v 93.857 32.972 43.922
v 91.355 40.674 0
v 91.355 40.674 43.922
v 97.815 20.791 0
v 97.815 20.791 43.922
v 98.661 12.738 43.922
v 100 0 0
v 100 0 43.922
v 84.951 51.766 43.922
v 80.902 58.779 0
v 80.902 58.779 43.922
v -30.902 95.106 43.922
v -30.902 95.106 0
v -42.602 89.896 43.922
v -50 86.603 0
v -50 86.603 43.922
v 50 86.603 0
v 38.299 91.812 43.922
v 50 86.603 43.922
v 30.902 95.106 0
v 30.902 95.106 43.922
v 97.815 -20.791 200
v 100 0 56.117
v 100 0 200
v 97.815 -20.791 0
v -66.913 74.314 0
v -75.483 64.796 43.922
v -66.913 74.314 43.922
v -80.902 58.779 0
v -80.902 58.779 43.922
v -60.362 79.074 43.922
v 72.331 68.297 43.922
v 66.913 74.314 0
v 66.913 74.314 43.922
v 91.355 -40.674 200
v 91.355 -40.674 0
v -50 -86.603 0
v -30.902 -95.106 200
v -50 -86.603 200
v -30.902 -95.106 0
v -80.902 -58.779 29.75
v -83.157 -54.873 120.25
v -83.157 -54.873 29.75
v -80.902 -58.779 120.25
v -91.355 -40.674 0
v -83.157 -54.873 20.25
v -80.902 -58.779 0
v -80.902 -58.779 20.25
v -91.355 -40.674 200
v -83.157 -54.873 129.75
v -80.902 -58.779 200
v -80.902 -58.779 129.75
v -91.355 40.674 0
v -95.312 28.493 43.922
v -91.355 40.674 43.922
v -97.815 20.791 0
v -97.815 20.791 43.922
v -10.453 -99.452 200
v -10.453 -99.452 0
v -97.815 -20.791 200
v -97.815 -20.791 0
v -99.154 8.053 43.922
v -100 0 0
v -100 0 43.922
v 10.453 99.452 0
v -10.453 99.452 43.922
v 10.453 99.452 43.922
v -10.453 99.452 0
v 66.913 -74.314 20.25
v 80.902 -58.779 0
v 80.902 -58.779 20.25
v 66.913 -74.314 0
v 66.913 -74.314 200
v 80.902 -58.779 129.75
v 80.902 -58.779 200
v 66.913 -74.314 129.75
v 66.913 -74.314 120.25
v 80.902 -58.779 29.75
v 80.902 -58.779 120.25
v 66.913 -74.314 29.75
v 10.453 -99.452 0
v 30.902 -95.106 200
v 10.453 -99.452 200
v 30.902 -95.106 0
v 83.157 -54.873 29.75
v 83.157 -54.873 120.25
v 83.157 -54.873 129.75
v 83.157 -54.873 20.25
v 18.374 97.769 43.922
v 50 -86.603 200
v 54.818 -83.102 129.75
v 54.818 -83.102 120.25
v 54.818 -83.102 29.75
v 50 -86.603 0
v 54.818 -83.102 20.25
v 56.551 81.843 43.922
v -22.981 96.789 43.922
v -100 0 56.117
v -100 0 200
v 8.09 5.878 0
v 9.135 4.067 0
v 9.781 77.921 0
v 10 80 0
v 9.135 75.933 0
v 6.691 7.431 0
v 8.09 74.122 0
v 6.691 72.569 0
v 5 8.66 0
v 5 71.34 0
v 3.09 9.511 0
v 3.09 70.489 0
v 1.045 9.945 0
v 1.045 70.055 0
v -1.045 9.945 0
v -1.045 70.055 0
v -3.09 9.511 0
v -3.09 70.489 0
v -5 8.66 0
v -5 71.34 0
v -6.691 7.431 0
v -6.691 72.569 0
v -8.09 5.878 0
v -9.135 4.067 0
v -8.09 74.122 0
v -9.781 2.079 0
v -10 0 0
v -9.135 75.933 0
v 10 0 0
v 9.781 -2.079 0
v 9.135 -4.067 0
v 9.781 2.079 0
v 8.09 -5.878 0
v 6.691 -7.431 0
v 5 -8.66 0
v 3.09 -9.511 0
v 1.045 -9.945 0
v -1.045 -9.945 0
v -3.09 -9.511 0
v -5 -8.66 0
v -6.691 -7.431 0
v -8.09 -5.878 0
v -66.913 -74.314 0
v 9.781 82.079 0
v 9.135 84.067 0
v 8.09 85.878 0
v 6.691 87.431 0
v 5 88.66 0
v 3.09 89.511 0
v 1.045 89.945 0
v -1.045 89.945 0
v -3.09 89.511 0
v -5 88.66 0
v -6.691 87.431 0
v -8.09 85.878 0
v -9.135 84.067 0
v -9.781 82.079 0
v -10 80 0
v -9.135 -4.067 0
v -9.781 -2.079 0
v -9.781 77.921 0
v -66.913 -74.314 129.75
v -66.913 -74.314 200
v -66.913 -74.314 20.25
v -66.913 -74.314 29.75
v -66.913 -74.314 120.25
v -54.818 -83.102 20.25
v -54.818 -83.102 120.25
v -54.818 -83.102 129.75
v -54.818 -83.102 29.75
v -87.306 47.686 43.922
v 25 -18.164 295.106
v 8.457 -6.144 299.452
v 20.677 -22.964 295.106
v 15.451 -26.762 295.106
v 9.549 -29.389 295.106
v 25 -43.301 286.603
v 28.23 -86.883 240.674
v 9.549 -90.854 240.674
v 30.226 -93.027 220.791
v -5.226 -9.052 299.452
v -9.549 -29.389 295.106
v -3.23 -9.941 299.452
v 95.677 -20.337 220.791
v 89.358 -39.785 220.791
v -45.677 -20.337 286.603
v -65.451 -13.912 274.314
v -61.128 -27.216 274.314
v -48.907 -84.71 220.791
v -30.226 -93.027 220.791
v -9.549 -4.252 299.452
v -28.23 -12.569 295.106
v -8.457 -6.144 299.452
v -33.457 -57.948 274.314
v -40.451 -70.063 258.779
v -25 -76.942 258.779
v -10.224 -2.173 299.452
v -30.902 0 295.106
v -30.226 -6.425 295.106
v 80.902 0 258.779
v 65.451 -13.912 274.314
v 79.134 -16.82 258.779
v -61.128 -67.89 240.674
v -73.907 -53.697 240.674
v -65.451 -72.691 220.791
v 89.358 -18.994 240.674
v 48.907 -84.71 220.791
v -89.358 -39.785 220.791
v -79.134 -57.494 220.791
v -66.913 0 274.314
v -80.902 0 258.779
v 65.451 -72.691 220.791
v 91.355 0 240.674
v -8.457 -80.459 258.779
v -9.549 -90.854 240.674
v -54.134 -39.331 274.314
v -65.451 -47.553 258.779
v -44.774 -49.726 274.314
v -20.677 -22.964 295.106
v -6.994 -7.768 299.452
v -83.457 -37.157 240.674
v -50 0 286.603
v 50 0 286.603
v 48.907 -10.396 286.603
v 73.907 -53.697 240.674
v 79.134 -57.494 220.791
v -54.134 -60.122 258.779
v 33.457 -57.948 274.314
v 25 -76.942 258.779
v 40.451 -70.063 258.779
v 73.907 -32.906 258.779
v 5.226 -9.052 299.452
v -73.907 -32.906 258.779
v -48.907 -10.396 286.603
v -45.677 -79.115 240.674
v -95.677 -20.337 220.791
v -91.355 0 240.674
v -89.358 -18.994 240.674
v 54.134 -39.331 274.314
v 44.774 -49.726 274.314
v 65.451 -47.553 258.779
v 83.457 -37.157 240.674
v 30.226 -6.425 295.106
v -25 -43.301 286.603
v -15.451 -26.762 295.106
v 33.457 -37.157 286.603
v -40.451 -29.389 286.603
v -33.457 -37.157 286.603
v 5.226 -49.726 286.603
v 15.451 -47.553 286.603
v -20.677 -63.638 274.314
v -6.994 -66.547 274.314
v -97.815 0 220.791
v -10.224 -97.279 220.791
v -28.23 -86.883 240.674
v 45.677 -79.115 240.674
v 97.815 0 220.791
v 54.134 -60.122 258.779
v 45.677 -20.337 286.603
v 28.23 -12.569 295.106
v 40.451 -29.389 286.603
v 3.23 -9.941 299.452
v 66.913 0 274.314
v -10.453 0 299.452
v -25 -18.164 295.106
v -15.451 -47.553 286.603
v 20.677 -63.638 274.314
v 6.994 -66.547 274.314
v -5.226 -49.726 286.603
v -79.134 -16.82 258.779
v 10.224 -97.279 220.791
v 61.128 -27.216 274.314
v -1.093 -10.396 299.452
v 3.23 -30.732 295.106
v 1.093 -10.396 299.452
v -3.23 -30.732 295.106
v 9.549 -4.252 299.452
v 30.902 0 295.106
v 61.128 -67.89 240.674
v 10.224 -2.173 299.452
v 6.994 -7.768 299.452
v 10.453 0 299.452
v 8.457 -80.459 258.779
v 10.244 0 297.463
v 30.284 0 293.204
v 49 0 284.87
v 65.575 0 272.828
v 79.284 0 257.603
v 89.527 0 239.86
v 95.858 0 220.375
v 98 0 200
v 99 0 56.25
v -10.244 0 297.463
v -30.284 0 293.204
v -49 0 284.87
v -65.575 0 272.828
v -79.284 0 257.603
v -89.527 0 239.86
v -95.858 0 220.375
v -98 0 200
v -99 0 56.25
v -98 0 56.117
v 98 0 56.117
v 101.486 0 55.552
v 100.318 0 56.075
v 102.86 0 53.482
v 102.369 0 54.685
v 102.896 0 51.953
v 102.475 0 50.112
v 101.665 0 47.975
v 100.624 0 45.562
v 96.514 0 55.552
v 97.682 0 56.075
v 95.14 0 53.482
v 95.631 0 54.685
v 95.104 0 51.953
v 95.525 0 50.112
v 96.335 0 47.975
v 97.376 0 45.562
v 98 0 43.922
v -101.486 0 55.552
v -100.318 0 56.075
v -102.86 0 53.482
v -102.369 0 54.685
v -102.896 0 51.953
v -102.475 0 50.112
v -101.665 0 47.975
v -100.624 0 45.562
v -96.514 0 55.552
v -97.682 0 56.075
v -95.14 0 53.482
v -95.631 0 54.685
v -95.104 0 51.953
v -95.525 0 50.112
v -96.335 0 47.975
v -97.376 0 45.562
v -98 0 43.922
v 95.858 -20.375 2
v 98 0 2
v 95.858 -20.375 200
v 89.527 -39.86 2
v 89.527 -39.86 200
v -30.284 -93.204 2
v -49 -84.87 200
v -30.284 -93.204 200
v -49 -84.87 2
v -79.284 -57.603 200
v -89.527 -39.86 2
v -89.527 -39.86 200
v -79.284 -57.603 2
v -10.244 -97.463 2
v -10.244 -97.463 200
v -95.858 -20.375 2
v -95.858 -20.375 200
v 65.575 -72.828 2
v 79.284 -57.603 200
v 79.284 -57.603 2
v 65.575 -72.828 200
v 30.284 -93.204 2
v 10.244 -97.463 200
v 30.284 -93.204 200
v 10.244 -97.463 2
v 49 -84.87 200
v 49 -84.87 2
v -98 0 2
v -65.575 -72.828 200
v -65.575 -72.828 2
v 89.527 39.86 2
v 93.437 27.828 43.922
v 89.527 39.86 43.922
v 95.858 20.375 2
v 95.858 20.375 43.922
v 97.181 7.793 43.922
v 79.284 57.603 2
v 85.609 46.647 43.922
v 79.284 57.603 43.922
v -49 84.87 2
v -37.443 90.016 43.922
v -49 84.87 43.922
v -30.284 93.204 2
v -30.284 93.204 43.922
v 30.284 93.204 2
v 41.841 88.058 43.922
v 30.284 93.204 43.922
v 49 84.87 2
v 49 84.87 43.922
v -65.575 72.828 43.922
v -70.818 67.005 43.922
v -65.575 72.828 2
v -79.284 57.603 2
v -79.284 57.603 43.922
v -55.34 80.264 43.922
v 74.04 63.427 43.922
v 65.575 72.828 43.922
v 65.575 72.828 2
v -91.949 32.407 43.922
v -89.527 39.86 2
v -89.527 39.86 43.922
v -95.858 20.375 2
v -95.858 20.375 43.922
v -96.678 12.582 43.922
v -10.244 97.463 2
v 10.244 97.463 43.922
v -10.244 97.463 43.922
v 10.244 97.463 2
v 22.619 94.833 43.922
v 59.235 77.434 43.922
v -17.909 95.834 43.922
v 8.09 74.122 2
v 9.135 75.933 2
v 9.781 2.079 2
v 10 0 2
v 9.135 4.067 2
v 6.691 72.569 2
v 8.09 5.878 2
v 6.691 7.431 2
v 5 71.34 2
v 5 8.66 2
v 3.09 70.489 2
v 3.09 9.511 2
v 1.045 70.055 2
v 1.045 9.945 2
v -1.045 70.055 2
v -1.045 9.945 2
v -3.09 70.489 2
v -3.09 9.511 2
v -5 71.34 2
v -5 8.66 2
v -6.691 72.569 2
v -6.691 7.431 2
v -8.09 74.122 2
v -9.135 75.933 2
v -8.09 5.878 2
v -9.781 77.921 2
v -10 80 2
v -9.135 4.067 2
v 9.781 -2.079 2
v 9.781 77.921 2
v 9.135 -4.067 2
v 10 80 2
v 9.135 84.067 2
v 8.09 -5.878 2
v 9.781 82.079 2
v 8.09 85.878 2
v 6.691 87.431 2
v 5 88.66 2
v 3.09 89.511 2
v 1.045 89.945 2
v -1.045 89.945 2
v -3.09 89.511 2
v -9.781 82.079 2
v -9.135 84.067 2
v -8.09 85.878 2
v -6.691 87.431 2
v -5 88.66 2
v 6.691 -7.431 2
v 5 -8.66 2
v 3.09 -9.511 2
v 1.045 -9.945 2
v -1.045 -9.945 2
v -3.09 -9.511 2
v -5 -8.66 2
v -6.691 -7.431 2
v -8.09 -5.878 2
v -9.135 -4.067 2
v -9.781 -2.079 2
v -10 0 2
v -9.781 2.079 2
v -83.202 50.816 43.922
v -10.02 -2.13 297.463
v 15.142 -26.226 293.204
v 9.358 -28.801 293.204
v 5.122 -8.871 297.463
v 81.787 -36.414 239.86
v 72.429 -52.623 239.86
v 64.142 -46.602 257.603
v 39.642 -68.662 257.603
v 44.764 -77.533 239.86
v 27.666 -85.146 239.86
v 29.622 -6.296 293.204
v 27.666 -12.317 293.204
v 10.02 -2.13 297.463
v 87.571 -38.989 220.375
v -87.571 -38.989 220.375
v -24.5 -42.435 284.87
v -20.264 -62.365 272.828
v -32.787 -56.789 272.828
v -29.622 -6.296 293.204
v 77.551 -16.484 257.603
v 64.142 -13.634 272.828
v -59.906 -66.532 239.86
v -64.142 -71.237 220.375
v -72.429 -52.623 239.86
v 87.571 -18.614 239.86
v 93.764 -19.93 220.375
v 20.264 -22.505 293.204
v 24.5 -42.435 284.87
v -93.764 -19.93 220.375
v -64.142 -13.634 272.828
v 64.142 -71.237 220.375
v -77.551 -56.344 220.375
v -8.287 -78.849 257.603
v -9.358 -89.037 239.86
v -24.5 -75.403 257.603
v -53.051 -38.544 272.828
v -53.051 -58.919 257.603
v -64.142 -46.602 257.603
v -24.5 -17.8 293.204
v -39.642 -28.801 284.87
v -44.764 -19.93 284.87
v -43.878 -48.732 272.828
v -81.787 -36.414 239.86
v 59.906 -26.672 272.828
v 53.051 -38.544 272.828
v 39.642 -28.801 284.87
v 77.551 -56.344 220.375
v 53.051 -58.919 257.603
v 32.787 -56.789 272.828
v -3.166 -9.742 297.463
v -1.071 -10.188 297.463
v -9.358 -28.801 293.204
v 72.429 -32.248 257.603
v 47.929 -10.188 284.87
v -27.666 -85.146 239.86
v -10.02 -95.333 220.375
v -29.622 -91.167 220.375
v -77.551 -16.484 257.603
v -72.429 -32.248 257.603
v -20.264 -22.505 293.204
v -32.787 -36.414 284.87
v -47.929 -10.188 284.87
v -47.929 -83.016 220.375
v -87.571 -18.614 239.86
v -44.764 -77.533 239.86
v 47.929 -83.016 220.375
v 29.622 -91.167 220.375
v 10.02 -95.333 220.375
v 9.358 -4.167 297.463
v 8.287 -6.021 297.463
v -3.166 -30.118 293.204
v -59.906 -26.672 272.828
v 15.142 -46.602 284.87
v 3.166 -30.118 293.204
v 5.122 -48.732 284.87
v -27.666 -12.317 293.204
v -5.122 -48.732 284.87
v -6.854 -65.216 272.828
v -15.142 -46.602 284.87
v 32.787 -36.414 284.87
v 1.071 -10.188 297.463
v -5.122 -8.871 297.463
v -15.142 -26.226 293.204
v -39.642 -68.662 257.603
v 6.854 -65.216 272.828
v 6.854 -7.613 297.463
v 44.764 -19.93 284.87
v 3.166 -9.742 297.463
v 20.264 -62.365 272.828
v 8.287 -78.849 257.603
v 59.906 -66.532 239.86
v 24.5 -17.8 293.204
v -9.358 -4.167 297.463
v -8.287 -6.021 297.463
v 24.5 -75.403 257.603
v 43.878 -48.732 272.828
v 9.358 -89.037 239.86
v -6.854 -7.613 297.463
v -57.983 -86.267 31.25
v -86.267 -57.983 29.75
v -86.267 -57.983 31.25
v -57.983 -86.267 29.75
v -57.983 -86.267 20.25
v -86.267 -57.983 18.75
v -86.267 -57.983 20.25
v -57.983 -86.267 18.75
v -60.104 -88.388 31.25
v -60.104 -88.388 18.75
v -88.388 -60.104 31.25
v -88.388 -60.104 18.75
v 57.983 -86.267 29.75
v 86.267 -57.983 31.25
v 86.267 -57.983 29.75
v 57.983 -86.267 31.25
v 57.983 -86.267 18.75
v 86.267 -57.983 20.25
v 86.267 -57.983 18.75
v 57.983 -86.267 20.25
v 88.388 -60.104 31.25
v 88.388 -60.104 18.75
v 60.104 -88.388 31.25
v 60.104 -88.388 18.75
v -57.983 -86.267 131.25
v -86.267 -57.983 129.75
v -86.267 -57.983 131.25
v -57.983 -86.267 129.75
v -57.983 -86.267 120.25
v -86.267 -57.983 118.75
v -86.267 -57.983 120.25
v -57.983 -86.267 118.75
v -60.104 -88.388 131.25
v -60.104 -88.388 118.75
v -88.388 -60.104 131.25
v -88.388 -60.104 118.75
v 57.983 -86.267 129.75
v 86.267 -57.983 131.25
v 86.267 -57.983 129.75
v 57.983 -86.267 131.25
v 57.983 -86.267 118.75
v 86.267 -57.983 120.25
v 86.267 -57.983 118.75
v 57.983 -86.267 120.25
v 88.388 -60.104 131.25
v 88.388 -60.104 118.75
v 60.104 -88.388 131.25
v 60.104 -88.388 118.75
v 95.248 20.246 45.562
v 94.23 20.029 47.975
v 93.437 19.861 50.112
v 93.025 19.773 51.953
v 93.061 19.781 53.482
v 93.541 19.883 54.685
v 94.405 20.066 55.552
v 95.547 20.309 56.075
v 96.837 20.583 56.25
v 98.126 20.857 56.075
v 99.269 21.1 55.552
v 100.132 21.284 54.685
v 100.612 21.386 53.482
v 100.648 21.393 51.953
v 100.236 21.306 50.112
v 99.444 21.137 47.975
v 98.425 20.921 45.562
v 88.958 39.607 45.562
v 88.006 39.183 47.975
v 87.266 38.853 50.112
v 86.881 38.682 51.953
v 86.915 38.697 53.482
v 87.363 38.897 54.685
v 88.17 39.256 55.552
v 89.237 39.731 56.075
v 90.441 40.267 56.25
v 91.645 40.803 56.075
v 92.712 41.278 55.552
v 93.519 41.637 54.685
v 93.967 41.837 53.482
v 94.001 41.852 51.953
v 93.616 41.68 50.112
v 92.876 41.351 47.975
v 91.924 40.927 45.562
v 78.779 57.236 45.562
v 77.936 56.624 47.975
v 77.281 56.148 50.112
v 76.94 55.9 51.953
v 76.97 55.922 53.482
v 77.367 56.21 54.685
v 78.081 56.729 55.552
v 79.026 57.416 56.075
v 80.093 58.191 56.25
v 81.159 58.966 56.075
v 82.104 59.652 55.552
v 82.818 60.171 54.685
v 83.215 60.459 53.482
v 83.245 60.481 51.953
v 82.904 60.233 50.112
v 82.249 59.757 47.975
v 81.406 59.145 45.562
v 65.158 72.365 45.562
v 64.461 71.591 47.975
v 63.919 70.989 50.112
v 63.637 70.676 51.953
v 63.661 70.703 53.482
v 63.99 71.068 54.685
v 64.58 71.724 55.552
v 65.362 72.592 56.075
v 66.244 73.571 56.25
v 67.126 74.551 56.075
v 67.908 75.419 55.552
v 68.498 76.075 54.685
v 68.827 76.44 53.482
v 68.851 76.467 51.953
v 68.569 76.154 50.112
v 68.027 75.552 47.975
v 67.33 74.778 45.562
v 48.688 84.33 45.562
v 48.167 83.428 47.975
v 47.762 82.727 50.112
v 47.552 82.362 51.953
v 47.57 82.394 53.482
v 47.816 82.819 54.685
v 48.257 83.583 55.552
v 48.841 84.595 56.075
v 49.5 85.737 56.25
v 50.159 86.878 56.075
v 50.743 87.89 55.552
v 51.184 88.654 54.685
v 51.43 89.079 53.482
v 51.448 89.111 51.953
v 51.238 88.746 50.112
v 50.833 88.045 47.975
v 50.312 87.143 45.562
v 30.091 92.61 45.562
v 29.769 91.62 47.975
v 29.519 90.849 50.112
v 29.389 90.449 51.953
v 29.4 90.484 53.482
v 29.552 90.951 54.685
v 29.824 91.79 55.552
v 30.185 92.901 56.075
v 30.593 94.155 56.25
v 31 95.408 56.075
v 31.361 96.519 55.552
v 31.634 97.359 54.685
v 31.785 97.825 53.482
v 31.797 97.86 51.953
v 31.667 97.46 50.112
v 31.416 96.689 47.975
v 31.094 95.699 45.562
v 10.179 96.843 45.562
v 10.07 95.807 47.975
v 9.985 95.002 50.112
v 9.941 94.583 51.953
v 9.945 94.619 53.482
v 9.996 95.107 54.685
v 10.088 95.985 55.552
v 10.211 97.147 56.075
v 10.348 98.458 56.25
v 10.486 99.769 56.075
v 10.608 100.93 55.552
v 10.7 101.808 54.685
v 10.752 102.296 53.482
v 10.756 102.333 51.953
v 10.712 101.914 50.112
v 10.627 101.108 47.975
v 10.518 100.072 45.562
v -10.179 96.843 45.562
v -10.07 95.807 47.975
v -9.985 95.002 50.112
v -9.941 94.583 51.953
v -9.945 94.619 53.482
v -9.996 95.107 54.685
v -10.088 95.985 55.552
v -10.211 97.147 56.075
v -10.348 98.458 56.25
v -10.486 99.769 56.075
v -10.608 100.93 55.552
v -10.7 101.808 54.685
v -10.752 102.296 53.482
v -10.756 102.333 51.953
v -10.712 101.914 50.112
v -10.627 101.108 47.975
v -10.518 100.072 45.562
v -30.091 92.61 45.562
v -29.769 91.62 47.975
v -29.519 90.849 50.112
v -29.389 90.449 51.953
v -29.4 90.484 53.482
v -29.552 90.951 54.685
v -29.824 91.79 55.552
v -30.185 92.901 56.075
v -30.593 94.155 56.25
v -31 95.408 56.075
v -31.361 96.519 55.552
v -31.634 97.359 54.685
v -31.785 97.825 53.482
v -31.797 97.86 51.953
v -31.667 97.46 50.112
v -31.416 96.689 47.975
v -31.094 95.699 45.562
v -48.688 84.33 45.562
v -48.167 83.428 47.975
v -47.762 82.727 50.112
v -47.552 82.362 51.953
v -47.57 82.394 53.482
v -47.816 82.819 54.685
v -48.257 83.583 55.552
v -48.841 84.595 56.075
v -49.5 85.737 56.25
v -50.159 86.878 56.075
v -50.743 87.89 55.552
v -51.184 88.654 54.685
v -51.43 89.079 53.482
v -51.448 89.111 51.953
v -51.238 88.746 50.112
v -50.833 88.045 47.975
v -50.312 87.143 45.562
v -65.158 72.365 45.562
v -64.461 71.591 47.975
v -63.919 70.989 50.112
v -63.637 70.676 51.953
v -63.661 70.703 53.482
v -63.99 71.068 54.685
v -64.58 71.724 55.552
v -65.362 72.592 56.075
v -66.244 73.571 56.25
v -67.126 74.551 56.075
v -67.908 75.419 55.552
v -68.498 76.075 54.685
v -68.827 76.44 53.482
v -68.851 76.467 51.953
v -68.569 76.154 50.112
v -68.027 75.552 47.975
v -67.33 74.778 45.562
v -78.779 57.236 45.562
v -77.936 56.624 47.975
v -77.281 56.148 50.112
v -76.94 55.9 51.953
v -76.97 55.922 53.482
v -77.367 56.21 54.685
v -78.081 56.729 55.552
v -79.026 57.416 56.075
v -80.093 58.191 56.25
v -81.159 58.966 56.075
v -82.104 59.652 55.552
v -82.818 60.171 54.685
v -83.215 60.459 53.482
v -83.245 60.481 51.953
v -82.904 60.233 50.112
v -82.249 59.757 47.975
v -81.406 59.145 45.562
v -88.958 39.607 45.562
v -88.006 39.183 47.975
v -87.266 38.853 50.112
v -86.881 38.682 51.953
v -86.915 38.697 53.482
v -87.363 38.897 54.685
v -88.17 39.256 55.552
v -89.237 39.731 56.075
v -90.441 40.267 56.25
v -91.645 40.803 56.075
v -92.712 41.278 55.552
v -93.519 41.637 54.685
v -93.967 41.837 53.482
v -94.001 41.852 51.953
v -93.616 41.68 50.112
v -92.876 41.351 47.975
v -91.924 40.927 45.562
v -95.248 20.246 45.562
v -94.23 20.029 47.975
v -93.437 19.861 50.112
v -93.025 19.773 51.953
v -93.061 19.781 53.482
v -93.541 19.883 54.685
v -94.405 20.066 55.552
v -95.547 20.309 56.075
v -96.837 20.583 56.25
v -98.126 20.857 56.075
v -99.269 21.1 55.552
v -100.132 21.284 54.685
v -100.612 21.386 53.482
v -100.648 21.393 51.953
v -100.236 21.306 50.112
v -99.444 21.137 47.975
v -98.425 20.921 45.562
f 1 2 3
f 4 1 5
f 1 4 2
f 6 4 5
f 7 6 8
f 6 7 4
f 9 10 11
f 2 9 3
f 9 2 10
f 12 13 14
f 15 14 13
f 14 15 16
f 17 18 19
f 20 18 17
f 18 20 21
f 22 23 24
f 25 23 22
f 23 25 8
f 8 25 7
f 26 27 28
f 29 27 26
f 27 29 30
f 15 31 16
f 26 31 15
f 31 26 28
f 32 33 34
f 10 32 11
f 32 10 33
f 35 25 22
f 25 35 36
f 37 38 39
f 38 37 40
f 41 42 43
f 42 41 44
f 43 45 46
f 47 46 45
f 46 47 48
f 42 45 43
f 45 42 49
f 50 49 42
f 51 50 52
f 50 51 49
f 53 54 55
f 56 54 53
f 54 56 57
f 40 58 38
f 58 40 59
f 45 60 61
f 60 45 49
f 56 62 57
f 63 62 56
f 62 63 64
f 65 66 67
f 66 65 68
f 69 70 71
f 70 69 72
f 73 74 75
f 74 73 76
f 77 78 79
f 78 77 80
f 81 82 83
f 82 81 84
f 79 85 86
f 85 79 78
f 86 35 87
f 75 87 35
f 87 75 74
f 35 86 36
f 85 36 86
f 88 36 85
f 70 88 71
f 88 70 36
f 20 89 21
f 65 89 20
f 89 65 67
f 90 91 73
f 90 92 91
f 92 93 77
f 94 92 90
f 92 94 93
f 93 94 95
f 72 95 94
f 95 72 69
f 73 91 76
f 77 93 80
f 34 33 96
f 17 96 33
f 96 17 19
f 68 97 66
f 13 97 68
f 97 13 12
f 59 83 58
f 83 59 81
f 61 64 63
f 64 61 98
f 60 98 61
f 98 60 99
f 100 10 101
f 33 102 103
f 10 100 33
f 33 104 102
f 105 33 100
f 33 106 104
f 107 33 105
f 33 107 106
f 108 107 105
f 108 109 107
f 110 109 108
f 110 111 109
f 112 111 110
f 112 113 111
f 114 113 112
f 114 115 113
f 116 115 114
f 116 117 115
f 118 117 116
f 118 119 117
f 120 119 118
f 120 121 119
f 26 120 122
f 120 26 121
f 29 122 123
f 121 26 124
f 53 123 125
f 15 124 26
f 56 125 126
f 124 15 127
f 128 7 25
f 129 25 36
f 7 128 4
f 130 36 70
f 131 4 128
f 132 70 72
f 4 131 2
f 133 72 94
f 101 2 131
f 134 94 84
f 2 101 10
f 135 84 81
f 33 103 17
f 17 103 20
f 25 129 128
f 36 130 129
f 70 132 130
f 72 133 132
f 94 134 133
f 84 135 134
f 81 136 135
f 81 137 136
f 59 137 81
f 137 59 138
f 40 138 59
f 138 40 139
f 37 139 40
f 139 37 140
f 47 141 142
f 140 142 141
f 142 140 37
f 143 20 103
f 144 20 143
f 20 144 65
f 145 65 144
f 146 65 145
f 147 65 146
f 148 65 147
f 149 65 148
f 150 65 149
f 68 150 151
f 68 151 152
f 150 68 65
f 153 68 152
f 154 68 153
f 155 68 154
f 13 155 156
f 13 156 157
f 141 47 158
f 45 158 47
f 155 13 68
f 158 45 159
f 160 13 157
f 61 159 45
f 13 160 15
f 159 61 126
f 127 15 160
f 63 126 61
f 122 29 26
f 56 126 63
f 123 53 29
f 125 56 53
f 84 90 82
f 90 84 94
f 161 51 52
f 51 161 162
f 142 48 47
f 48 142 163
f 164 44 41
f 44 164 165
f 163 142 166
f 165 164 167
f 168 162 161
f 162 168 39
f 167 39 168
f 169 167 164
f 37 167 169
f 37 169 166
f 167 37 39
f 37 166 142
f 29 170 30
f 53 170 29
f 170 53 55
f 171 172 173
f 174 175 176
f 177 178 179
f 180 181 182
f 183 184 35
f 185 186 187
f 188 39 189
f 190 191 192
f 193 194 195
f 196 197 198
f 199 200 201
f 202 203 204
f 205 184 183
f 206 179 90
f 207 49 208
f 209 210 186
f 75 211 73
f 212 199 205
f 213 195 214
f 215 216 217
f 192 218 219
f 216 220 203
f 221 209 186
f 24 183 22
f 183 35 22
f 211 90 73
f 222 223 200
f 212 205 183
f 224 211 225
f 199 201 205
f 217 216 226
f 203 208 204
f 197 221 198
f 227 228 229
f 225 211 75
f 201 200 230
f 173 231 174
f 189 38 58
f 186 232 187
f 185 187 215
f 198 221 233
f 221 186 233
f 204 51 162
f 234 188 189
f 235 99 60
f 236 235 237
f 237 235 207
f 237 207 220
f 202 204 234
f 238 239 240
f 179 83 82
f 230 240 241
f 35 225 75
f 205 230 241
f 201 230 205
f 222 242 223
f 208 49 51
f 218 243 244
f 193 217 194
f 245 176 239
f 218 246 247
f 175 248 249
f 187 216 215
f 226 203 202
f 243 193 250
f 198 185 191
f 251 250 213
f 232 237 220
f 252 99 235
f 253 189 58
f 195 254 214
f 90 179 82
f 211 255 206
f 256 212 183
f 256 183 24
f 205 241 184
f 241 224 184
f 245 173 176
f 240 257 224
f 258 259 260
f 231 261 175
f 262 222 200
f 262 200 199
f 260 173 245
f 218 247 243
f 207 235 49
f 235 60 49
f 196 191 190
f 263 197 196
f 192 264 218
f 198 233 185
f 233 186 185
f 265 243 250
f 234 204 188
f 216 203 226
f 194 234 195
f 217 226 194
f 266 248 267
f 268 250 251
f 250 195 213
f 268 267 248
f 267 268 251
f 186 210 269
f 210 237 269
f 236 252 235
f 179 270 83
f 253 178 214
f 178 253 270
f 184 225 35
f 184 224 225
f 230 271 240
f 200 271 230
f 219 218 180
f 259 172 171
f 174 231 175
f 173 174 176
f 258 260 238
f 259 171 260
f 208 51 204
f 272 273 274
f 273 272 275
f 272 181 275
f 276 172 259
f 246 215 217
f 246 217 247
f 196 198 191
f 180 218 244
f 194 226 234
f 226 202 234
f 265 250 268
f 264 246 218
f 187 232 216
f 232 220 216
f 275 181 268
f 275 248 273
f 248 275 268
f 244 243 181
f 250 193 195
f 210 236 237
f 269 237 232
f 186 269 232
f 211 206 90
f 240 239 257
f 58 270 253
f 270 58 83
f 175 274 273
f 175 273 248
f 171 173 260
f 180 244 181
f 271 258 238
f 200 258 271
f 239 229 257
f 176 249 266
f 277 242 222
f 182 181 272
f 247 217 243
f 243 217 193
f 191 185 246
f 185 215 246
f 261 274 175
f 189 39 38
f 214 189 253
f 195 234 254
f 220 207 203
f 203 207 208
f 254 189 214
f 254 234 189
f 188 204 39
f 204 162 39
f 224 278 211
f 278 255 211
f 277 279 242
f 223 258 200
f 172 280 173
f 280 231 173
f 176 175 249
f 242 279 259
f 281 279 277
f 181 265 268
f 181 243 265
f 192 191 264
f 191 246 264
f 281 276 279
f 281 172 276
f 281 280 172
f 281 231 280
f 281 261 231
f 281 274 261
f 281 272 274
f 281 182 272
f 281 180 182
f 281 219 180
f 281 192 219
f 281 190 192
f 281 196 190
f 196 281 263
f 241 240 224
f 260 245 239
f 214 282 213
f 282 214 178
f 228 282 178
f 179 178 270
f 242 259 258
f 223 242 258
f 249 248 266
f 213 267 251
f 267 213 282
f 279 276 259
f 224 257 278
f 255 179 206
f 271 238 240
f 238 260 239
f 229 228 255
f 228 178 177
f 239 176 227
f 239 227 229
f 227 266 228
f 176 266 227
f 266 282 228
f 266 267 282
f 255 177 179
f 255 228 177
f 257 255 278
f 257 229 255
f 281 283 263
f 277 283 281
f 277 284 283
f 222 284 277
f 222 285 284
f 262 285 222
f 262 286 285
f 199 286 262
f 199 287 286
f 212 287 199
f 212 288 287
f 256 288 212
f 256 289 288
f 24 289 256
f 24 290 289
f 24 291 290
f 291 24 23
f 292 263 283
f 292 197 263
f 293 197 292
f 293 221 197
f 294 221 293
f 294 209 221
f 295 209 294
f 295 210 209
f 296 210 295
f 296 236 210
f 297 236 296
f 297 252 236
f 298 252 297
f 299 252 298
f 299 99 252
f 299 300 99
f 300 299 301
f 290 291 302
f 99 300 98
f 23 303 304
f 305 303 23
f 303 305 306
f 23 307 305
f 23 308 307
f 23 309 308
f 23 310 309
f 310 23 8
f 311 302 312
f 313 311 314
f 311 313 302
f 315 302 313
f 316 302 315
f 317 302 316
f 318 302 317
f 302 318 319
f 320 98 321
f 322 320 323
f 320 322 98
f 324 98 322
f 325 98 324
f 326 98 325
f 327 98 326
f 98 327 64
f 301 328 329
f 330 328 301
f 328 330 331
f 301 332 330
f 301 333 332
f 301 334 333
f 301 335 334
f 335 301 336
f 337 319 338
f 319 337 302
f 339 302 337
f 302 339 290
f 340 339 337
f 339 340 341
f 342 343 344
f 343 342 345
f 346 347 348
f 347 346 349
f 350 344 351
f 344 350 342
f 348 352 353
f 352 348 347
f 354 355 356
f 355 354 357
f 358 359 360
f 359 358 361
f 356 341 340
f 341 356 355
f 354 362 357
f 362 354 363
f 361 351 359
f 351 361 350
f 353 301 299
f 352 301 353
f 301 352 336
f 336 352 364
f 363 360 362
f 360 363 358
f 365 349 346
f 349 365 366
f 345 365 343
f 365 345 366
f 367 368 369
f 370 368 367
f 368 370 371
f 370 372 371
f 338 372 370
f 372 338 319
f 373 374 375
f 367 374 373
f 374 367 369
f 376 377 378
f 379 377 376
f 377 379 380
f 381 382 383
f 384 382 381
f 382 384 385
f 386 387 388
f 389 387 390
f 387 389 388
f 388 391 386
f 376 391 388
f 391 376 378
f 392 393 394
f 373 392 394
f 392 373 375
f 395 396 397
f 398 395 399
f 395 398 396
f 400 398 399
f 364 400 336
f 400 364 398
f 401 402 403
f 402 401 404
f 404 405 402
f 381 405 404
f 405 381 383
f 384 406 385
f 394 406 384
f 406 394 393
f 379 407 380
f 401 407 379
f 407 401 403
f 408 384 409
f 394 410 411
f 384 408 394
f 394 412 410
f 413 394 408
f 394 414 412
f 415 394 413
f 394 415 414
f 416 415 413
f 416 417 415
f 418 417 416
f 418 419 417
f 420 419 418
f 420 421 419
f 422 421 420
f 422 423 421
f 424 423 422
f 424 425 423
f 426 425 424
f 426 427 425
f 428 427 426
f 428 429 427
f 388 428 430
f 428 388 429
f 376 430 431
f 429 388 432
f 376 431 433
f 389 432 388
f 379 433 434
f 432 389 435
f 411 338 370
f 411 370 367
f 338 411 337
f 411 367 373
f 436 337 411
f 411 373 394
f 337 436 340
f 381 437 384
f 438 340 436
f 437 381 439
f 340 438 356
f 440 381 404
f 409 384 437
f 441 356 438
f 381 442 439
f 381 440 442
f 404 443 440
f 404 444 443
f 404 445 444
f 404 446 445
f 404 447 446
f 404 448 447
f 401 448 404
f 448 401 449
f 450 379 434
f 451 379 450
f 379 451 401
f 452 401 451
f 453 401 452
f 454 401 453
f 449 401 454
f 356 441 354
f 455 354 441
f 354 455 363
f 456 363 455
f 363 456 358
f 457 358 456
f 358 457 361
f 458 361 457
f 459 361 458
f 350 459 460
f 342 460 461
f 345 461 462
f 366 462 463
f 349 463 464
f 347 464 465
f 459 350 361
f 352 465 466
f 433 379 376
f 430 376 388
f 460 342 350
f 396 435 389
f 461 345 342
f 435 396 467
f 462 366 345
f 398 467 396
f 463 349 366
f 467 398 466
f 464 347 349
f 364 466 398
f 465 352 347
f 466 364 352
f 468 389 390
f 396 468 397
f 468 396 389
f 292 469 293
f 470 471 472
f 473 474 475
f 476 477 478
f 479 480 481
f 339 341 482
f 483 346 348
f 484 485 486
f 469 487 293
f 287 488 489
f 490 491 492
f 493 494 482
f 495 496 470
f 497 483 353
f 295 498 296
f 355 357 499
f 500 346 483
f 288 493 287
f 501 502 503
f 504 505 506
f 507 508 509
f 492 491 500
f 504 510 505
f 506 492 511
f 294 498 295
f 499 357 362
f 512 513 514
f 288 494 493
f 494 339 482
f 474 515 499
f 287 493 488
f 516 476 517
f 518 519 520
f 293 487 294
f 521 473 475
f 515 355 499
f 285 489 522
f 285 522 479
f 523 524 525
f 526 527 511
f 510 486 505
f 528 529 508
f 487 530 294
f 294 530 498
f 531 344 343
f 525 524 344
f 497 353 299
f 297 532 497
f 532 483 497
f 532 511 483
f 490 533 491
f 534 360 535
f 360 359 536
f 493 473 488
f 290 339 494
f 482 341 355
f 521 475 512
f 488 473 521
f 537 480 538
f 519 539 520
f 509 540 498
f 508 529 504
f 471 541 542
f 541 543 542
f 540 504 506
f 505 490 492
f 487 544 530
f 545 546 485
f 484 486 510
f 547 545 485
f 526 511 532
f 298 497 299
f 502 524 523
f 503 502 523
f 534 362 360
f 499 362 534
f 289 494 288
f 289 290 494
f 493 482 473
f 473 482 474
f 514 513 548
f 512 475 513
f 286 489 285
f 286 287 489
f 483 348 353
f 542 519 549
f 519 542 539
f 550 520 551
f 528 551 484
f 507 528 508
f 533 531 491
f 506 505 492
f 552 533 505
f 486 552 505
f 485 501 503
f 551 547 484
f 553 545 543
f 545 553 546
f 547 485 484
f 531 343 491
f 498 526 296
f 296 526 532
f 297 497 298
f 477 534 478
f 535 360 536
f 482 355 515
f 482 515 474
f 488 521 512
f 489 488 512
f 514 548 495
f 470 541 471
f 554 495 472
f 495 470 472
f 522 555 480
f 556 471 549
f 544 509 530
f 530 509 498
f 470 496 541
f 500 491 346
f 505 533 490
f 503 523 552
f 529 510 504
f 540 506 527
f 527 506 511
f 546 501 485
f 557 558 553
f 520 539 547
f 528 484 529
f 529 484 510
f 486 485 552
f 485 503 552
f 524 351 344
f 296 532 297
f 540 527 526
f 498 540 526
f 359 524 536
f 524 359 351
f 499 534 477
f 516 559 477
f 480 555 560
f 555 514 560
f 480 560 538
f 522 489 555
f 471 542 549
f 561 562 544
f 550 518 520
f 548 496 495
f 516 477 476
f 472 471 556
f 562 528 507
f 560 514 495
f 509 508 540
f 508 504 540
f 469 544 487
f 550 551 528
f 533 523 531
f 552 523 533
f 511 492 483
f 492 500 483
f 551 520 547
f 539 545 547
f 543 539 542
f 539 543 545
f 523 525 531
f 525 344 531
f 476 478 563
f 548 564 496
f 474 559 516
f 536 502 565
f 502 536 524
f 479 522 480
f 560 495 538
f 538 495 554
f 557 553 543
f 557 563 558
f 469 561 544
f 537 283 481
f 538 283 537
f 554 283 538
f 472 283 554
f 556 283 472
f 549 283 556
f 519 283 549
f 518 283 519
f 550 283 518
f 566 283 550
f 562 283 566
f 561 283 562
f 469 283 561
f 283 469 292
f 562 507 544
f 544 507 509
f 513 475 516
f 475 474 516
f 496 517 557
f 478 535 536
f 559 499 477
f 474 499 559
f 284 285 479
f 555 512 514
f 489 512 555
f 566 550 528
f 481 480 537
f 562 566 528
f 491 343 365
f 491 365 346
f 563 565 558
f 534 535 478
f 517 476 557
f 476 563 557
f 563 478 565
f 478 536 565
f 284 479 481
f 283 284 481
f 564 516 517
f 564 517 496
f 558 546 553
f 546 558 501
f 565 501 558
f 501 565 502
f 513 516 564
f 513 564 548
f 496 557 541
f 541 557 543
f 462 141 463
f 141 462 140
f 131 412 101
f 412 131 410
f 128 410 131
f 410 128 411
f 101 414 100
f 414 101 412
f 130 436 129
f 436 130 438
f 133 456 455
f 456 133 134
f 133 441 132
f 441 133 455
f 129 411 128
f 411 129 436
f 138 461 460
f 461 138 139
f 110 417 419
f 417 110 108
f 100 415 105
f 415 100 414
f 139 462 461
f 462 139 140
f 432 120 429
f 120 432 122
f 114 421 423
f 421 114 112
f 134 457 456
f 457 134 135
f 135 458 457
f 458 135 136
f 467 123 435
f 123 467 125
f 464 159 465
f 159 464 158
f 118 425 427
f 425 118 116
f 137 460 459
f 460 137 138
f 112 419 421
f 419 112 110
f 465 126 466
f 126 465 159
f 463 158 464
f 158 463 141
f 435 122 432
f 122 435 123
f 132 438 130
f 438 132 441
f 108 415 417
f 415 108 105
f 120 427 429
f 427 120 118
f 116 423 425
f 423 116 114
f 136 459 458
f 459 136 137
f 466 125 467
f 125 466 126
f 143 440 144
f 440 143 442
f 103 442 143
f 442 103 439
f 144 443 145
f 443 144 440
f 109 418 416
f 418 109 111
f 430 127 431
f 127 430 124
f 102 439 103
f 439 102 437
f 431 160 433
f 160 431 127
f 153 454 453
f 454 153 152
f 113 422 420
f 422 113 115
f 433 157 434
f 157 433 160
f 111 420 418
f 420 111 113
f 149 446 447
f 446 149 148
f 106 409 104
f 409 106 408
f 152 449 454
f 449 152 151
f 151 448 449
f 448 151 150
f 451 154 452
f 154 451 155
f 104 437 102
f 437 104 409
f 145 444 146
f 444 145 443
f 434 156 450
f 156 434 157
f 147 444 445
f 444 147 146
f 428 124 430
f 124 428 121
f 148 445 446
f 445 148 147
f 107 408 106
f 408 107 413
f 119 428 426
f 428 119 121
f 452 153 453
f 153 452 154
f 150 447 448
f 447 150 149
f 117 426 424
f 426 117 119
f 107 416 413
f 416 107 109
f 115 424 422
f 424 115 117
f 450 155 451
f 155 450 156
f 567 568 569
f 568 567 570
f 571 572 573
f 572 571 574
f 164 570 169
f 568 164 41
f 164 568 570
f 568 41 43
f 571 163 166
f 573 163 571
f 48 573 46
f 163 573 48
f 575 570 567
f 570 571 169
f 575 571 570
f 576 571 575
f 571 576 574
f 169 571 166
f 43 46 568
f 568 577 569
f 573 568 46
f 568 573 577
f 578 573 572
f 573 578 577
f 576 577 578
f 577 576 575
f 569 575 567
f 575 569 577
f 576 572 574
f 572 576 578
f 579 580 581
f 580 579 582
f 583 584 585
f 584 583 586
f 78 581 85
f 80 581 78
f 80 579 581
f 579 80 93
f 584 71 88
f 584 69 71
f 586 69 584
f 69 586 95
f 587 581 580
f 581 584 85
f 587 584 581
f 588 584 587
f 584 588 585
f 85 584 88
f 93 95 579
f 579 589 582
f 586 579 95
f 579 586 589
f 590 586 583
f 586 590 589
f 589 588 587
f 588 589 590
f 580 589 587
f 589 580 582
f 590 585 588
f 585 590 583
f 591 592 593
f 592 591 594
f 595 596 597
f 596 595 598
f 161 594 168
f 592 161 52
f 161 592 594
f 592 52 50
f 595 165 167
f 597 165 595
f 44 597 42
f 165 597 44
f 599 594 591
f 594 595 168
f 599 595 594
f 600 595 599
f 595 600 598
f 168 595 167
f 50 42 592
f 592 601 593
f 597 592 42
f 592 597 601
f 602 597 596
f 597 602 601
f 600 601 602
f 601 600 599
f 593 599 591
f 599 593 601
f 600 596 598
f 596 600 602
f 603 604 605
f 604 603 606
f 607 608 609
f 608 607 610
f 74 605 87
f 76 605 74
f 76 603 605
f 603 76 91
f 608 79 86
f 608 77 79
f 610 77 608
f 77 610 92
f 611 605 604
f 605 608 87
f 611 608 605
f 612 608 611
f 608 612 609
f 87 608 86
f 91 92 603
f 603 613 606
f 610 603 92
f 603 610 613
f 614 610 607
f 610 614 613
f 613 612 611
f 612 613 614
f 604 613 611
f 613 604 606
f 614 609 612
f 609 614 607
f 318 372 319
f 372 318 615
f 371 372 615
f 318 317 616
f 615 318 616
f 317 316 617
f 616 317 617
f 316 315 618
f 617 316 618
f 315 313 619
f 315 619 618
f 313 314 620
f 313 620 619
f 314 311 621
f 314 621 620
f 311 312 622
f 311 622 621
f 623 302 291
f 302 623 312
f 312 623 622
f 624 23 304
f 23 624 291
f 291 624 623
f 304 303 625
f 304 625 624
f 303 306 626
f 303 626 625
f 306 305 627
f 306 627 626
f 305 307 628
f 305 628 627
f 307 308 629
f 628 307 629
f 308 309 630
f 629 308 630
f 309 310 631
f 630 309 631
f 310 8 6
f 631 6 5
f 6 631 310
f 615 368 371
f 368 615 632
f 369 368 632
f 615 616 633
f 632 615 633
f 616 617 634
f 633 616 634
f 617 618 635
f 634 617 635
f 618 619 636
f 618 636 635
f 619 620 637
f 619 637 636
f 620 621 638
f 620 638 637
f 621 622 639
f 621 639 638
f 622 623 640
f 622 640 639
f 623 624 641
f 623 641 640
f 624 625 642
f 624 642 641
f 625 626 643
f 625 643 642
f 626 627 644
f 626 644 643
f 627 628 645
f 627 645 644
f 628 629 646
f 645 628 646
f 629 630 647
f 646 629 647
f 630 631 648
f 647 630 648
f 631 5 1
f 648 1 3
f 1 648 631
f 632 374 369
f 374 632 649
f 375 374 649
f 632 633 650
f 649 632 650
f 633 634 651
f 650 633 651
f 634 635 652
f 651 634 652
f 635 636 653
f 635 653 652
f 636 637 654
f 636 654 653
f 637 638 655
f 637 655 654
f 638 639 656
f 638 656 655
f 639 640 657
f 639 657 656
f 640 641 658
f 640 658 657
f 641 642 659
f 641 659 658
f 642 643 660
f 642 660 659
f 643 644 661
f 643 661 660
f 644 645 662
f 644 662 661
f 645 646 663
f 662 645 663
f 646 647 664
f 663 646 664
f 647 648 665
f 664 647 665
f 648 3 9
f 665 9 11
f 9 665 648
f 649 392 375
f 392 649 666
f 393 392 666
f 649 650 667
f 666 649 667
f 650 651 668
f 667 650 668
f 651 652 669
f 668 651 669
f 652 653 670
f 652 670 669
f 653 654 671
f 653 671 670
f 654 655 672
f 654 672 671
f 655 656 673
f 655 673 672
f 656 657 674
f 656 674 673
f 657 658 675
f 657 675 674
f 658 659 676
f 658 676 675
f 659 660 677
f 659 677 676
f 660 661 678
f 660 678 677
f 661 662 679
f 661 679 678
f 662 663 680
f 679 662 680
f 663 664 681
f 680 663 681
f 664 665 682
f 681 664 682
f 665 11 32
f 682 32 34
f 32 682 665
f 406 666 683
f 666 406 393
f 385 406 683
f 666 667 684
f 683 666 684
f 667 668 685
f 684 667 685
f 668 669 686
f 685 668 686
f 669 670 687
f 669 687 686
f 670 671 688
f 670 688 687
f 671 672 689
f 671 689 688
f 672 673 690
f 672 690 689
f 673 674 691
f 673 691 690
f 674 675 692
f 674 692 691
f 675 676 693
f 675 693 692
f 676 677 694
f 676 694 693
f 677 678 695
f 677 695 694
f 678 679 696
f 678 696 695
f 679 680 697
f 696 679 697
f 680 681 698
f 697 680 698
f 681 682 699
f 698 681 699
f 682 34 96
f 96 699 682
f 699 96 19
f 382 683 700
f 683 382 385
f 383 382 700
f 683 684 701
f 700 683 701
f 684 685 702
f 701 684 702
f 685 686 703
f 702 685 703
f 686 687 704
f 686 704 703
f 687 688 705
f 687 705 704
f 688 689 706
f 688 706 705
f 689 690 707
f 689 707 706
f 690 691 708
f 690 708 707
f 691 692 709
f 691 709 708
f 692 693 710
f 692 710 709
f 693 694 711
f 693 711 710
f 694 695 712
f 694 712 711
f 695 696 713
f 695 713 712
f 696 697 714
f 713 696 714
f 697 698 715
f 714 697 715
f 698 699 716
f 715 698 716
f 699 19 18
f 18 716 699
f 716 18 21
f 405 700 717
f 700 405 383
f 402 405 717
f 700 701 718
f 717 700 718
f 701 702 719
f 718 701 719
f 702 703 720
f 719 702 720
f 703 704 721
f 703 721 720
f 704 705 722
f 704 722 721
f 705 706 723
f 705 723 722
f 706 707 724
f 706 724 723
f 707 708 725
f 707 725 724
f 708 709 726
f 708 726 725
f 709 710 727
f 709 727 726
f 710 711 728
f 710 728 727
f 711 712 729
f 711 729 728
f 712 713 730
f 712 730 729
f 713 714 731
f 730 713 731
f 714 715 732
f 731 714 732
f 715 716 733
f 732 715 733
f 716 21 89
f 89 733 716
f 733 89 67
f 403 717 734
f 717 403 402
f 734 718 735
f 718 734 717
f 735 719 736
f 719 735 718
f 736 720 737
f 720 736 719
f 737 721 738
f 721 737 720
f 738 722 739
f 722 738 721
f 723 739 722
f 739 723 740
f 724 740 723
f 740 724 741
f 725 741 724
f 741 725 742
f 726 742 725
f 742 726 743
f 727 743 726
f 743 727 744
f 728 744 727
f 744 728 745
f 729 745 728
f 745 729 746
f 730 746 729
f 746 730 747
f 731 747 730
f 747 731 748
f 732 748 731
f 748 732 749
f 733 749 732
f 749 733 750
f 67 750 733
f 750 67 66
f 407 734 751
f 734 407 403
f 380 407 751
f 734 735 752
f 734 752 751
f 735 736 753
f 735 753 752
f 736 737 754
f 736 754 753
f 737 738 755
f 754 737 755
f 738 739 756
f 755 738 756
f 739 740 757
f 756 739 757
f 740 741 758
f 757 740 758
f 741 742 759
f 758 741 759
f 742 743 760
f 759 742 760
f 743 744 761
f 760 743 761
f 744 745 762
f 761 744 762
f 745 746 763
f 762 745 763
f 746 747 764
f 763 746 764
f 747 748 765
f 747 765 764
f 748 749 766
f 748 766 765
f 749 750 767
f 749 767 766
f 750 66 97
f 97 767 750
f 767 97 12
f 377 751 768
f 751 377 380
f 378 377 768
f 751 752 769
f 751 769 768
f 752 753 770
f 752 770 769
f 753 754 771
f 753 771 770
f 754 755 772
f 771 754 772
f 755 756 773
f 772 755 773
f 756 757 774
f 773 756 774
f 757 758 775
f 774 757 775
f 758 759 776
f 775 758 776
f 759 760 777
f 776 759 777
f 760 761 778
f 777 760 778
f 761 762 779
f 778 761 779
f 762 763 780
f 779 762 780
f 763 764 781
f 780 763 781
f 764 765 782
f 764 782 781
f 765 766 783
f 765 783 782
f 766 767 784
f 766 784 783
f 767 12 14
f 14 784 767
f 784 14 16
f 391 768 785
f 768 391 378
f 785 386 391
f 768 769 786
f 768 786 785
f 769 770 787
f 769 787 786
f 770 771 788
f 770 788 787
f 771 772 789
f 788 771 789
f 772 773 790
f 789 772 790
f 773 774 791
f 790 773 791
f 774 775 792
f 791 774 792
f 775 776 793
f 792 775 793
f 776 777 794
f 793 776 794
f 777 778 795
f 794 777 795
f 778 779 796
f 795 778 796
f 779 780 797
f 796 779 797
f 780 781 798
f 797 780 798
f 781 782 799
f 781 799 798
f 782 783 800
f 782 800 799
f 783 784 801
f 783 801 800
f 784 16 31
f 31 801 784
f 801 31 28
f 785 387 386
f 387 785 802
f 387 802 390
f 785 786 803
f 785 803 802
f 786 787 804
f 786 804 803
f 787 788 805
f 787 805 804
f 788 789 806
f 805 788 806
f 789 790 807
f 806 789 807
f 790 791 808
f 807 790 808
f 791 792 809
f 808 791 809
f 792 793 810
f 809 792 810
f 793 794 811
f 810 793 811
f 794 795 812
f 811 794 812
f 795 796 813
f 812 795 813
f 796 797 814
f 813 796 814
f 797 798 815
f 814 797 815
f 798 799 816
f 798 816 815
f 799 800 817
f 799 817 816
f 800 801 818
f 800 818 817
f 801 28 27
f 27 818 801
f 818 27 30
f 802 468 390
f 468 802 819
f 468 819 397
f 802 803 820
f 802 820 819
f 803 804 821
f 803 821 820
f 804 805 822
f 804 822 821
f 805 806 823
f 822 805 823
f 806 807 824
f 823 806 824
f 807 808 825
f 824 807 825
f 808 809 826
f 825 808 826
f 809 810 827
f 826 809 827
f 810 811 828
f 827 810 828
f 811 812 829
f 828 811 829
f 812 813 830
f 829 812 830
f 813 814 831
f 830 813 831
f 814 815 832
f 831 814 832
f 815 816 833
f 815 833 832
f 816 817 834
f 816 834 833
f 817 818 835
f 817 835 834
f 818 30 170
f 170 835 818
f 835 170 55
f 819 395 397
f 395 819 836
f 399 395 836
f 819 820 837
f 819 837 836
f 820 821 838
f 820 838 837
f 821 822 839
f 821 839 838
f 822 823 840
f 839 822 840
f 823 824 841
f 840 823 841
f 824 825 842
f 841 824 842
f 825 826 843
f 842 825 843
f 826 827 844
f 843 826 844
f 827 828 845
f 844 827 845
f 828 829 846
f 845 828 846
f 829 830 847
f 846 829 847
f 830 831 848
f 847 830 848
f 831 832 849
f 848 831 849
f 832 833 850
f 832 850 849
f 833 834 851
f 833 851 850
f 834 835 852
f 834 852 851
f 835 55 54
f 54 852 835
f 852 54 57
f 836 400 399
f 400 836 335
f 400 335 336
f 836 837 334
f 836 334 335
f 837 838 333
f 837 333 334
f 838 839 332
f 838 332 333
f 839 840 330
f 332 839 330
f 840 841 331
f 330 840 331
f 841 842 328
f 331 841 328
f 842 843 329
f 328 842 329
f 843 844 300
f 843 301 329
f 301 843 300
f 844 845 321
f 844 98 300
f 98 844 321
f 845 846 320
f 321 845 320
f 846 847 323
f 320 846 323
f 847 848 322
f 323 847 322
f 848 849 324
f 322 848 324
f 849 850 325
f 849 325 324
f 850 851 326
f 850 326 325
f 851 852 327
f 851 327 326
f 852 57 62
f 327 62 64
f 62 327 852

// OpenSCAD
// file: bezier.scad
module line(p1,p2,w) {
    hull() {
        translate(p1) circle(r=w);
        translate(p2) circle(r=w);
    }
}
module polyline(points, index, w) {
    if(index < len(points)) {
        line(points[index - 1], points[index],w);
        polyline(points, index + 1, w);
    }
}

function choose(n, k)=
     k == 0? 1
    : (n * choose(n - 1, k - 1)) / k;

function _point_on_bezier_rec(points,t,i,c)=
    len(points) == i ? c
    : _point_on_bezier_rec(points,t,i+1,c+choose(len(points)-1,i) * pow(t,i) * pow(1-t,len(points)-i-1) * points[i]);

function _point_on_bezier(points,t)=
    _point_on_bezier_rec(points,t,0,[0,0]);

//a bezier curve with any number of control points
//parameters: 
//points - the control points of the bezier curve (number of points is variable)
//resolution - the sampling resolution of the bezier curve (number of returned points)
//returns:
//resolution number of samples on the bezier curve
function bezier(points,fn)=[
    for (t =[0:1.0/fn:1+(1/fn/2)]) _point_on_bezier(points, t)
    ];

//create a 3D rotational model with a bezier curve of given points, resolution and thickness
module bezier_model(points,resolution,thickness) {
    translate([0,0,thickness/2]) rotate_extrude() polyline(bezier(points,resolution),1,thickness/2);
}
    
// main file
h = 200;
r = 100;
s = 2;
big = 100000;

bottom_height = 50;
tube_r = 10;

difference() {
union() {
cylinder(h,r,r);
translate([0,0,h])sphere(r);
//rotate([0,0,-90])translate([r,0,0])cylinder(big,tube_r+2,tube_r+2);

}
translate([-big/2,0,bottom_height])cube([big,big,big]);
translate([0,0,bottom_height])cylinder(h-bottom_height,r-s,r-s);
translate([0,0,s])cylinder(bottom_height,r-s,r-s);
translate([0,0,h])sphere(r-s);

//rotate([0,0,-90])translate([r,0,0])cylinder(big,tube_r+s,tube_r+s);

cylinder(s,tube_r,tube_r);
translate([0,r*0.8,0])cylinder(s,tube_r,tube_r);


}


//intersection(){
//difference() {
//rotate([0,0,-90])translate([r,0,0])cylinder(big,tube_r+s,tube_r+s);
//rotate([0,0,-90])translate([r,0,0])cylinder(big,tube_r,tube_r);
//}
//union() {
//cylinder(h,r,r);
//translate([0,0,h])sphere(r);
////rotate([0,0,-90])translate([r,0,0])cylinder(big,tube_r+2,tube_r+2);
//
//}
//}
use <bezier.scad>
    sl = 20;
    sh=20;
    //border for sitting
    difference(){
    translate([0,0,bottom_height-sh/2])
        rotate_extrude(angle=180)
        translate([r-s/2,0,0])
        polygon(bezier([[0,0],[-s/2,sh*0.6],[-sl,sh],[sl,sh],[s/2,sh*0.6],[0,0]],20));

    }





//holder width 1
hw1 = 9.5;
//holder width 2
hw2 = 12.5;
//holder length 1
hd1 = 2;
//holder length 2
hd2 = 3;
//holder zize
hl = 40;
 
module holder(hw1,hw2,hd1,hd2,hl) {
    translate([0,-hl/2,-hw1/2])cube([hd1,hl,hw1]);
    translate([-hd1*5,-hl/2,-hw1/2])cube([hd1*5,hl,hw1]); //longer thing, bugfix
    translate([hd1,-hl/2,-hw2/2]) cube([hd2,hl,hw2]);
} 
difference(){
    union(){
rotate([0,0,-135]){
translate([r,0,bottom_height/2])holder(hw1,hw2,hd1,hd2,hl);
rotate([0,0,90])translate([r,0,bottom_height/2])holder(hw1,hw2,hd1,hd2,hl);
}
translate([0,0,h/2])rotate([0,0,-135]){
translate([r,0,bottom_height/2])holder(hw1,hw2,hd1,hd2,hl);
rotate([0,0,90])translate([r,0,bottom_height/2])holder(hw1,hw2,hd1,hd2,hl);
}
}
cylinder(h-bottom_height,r-s,r-s);
}
